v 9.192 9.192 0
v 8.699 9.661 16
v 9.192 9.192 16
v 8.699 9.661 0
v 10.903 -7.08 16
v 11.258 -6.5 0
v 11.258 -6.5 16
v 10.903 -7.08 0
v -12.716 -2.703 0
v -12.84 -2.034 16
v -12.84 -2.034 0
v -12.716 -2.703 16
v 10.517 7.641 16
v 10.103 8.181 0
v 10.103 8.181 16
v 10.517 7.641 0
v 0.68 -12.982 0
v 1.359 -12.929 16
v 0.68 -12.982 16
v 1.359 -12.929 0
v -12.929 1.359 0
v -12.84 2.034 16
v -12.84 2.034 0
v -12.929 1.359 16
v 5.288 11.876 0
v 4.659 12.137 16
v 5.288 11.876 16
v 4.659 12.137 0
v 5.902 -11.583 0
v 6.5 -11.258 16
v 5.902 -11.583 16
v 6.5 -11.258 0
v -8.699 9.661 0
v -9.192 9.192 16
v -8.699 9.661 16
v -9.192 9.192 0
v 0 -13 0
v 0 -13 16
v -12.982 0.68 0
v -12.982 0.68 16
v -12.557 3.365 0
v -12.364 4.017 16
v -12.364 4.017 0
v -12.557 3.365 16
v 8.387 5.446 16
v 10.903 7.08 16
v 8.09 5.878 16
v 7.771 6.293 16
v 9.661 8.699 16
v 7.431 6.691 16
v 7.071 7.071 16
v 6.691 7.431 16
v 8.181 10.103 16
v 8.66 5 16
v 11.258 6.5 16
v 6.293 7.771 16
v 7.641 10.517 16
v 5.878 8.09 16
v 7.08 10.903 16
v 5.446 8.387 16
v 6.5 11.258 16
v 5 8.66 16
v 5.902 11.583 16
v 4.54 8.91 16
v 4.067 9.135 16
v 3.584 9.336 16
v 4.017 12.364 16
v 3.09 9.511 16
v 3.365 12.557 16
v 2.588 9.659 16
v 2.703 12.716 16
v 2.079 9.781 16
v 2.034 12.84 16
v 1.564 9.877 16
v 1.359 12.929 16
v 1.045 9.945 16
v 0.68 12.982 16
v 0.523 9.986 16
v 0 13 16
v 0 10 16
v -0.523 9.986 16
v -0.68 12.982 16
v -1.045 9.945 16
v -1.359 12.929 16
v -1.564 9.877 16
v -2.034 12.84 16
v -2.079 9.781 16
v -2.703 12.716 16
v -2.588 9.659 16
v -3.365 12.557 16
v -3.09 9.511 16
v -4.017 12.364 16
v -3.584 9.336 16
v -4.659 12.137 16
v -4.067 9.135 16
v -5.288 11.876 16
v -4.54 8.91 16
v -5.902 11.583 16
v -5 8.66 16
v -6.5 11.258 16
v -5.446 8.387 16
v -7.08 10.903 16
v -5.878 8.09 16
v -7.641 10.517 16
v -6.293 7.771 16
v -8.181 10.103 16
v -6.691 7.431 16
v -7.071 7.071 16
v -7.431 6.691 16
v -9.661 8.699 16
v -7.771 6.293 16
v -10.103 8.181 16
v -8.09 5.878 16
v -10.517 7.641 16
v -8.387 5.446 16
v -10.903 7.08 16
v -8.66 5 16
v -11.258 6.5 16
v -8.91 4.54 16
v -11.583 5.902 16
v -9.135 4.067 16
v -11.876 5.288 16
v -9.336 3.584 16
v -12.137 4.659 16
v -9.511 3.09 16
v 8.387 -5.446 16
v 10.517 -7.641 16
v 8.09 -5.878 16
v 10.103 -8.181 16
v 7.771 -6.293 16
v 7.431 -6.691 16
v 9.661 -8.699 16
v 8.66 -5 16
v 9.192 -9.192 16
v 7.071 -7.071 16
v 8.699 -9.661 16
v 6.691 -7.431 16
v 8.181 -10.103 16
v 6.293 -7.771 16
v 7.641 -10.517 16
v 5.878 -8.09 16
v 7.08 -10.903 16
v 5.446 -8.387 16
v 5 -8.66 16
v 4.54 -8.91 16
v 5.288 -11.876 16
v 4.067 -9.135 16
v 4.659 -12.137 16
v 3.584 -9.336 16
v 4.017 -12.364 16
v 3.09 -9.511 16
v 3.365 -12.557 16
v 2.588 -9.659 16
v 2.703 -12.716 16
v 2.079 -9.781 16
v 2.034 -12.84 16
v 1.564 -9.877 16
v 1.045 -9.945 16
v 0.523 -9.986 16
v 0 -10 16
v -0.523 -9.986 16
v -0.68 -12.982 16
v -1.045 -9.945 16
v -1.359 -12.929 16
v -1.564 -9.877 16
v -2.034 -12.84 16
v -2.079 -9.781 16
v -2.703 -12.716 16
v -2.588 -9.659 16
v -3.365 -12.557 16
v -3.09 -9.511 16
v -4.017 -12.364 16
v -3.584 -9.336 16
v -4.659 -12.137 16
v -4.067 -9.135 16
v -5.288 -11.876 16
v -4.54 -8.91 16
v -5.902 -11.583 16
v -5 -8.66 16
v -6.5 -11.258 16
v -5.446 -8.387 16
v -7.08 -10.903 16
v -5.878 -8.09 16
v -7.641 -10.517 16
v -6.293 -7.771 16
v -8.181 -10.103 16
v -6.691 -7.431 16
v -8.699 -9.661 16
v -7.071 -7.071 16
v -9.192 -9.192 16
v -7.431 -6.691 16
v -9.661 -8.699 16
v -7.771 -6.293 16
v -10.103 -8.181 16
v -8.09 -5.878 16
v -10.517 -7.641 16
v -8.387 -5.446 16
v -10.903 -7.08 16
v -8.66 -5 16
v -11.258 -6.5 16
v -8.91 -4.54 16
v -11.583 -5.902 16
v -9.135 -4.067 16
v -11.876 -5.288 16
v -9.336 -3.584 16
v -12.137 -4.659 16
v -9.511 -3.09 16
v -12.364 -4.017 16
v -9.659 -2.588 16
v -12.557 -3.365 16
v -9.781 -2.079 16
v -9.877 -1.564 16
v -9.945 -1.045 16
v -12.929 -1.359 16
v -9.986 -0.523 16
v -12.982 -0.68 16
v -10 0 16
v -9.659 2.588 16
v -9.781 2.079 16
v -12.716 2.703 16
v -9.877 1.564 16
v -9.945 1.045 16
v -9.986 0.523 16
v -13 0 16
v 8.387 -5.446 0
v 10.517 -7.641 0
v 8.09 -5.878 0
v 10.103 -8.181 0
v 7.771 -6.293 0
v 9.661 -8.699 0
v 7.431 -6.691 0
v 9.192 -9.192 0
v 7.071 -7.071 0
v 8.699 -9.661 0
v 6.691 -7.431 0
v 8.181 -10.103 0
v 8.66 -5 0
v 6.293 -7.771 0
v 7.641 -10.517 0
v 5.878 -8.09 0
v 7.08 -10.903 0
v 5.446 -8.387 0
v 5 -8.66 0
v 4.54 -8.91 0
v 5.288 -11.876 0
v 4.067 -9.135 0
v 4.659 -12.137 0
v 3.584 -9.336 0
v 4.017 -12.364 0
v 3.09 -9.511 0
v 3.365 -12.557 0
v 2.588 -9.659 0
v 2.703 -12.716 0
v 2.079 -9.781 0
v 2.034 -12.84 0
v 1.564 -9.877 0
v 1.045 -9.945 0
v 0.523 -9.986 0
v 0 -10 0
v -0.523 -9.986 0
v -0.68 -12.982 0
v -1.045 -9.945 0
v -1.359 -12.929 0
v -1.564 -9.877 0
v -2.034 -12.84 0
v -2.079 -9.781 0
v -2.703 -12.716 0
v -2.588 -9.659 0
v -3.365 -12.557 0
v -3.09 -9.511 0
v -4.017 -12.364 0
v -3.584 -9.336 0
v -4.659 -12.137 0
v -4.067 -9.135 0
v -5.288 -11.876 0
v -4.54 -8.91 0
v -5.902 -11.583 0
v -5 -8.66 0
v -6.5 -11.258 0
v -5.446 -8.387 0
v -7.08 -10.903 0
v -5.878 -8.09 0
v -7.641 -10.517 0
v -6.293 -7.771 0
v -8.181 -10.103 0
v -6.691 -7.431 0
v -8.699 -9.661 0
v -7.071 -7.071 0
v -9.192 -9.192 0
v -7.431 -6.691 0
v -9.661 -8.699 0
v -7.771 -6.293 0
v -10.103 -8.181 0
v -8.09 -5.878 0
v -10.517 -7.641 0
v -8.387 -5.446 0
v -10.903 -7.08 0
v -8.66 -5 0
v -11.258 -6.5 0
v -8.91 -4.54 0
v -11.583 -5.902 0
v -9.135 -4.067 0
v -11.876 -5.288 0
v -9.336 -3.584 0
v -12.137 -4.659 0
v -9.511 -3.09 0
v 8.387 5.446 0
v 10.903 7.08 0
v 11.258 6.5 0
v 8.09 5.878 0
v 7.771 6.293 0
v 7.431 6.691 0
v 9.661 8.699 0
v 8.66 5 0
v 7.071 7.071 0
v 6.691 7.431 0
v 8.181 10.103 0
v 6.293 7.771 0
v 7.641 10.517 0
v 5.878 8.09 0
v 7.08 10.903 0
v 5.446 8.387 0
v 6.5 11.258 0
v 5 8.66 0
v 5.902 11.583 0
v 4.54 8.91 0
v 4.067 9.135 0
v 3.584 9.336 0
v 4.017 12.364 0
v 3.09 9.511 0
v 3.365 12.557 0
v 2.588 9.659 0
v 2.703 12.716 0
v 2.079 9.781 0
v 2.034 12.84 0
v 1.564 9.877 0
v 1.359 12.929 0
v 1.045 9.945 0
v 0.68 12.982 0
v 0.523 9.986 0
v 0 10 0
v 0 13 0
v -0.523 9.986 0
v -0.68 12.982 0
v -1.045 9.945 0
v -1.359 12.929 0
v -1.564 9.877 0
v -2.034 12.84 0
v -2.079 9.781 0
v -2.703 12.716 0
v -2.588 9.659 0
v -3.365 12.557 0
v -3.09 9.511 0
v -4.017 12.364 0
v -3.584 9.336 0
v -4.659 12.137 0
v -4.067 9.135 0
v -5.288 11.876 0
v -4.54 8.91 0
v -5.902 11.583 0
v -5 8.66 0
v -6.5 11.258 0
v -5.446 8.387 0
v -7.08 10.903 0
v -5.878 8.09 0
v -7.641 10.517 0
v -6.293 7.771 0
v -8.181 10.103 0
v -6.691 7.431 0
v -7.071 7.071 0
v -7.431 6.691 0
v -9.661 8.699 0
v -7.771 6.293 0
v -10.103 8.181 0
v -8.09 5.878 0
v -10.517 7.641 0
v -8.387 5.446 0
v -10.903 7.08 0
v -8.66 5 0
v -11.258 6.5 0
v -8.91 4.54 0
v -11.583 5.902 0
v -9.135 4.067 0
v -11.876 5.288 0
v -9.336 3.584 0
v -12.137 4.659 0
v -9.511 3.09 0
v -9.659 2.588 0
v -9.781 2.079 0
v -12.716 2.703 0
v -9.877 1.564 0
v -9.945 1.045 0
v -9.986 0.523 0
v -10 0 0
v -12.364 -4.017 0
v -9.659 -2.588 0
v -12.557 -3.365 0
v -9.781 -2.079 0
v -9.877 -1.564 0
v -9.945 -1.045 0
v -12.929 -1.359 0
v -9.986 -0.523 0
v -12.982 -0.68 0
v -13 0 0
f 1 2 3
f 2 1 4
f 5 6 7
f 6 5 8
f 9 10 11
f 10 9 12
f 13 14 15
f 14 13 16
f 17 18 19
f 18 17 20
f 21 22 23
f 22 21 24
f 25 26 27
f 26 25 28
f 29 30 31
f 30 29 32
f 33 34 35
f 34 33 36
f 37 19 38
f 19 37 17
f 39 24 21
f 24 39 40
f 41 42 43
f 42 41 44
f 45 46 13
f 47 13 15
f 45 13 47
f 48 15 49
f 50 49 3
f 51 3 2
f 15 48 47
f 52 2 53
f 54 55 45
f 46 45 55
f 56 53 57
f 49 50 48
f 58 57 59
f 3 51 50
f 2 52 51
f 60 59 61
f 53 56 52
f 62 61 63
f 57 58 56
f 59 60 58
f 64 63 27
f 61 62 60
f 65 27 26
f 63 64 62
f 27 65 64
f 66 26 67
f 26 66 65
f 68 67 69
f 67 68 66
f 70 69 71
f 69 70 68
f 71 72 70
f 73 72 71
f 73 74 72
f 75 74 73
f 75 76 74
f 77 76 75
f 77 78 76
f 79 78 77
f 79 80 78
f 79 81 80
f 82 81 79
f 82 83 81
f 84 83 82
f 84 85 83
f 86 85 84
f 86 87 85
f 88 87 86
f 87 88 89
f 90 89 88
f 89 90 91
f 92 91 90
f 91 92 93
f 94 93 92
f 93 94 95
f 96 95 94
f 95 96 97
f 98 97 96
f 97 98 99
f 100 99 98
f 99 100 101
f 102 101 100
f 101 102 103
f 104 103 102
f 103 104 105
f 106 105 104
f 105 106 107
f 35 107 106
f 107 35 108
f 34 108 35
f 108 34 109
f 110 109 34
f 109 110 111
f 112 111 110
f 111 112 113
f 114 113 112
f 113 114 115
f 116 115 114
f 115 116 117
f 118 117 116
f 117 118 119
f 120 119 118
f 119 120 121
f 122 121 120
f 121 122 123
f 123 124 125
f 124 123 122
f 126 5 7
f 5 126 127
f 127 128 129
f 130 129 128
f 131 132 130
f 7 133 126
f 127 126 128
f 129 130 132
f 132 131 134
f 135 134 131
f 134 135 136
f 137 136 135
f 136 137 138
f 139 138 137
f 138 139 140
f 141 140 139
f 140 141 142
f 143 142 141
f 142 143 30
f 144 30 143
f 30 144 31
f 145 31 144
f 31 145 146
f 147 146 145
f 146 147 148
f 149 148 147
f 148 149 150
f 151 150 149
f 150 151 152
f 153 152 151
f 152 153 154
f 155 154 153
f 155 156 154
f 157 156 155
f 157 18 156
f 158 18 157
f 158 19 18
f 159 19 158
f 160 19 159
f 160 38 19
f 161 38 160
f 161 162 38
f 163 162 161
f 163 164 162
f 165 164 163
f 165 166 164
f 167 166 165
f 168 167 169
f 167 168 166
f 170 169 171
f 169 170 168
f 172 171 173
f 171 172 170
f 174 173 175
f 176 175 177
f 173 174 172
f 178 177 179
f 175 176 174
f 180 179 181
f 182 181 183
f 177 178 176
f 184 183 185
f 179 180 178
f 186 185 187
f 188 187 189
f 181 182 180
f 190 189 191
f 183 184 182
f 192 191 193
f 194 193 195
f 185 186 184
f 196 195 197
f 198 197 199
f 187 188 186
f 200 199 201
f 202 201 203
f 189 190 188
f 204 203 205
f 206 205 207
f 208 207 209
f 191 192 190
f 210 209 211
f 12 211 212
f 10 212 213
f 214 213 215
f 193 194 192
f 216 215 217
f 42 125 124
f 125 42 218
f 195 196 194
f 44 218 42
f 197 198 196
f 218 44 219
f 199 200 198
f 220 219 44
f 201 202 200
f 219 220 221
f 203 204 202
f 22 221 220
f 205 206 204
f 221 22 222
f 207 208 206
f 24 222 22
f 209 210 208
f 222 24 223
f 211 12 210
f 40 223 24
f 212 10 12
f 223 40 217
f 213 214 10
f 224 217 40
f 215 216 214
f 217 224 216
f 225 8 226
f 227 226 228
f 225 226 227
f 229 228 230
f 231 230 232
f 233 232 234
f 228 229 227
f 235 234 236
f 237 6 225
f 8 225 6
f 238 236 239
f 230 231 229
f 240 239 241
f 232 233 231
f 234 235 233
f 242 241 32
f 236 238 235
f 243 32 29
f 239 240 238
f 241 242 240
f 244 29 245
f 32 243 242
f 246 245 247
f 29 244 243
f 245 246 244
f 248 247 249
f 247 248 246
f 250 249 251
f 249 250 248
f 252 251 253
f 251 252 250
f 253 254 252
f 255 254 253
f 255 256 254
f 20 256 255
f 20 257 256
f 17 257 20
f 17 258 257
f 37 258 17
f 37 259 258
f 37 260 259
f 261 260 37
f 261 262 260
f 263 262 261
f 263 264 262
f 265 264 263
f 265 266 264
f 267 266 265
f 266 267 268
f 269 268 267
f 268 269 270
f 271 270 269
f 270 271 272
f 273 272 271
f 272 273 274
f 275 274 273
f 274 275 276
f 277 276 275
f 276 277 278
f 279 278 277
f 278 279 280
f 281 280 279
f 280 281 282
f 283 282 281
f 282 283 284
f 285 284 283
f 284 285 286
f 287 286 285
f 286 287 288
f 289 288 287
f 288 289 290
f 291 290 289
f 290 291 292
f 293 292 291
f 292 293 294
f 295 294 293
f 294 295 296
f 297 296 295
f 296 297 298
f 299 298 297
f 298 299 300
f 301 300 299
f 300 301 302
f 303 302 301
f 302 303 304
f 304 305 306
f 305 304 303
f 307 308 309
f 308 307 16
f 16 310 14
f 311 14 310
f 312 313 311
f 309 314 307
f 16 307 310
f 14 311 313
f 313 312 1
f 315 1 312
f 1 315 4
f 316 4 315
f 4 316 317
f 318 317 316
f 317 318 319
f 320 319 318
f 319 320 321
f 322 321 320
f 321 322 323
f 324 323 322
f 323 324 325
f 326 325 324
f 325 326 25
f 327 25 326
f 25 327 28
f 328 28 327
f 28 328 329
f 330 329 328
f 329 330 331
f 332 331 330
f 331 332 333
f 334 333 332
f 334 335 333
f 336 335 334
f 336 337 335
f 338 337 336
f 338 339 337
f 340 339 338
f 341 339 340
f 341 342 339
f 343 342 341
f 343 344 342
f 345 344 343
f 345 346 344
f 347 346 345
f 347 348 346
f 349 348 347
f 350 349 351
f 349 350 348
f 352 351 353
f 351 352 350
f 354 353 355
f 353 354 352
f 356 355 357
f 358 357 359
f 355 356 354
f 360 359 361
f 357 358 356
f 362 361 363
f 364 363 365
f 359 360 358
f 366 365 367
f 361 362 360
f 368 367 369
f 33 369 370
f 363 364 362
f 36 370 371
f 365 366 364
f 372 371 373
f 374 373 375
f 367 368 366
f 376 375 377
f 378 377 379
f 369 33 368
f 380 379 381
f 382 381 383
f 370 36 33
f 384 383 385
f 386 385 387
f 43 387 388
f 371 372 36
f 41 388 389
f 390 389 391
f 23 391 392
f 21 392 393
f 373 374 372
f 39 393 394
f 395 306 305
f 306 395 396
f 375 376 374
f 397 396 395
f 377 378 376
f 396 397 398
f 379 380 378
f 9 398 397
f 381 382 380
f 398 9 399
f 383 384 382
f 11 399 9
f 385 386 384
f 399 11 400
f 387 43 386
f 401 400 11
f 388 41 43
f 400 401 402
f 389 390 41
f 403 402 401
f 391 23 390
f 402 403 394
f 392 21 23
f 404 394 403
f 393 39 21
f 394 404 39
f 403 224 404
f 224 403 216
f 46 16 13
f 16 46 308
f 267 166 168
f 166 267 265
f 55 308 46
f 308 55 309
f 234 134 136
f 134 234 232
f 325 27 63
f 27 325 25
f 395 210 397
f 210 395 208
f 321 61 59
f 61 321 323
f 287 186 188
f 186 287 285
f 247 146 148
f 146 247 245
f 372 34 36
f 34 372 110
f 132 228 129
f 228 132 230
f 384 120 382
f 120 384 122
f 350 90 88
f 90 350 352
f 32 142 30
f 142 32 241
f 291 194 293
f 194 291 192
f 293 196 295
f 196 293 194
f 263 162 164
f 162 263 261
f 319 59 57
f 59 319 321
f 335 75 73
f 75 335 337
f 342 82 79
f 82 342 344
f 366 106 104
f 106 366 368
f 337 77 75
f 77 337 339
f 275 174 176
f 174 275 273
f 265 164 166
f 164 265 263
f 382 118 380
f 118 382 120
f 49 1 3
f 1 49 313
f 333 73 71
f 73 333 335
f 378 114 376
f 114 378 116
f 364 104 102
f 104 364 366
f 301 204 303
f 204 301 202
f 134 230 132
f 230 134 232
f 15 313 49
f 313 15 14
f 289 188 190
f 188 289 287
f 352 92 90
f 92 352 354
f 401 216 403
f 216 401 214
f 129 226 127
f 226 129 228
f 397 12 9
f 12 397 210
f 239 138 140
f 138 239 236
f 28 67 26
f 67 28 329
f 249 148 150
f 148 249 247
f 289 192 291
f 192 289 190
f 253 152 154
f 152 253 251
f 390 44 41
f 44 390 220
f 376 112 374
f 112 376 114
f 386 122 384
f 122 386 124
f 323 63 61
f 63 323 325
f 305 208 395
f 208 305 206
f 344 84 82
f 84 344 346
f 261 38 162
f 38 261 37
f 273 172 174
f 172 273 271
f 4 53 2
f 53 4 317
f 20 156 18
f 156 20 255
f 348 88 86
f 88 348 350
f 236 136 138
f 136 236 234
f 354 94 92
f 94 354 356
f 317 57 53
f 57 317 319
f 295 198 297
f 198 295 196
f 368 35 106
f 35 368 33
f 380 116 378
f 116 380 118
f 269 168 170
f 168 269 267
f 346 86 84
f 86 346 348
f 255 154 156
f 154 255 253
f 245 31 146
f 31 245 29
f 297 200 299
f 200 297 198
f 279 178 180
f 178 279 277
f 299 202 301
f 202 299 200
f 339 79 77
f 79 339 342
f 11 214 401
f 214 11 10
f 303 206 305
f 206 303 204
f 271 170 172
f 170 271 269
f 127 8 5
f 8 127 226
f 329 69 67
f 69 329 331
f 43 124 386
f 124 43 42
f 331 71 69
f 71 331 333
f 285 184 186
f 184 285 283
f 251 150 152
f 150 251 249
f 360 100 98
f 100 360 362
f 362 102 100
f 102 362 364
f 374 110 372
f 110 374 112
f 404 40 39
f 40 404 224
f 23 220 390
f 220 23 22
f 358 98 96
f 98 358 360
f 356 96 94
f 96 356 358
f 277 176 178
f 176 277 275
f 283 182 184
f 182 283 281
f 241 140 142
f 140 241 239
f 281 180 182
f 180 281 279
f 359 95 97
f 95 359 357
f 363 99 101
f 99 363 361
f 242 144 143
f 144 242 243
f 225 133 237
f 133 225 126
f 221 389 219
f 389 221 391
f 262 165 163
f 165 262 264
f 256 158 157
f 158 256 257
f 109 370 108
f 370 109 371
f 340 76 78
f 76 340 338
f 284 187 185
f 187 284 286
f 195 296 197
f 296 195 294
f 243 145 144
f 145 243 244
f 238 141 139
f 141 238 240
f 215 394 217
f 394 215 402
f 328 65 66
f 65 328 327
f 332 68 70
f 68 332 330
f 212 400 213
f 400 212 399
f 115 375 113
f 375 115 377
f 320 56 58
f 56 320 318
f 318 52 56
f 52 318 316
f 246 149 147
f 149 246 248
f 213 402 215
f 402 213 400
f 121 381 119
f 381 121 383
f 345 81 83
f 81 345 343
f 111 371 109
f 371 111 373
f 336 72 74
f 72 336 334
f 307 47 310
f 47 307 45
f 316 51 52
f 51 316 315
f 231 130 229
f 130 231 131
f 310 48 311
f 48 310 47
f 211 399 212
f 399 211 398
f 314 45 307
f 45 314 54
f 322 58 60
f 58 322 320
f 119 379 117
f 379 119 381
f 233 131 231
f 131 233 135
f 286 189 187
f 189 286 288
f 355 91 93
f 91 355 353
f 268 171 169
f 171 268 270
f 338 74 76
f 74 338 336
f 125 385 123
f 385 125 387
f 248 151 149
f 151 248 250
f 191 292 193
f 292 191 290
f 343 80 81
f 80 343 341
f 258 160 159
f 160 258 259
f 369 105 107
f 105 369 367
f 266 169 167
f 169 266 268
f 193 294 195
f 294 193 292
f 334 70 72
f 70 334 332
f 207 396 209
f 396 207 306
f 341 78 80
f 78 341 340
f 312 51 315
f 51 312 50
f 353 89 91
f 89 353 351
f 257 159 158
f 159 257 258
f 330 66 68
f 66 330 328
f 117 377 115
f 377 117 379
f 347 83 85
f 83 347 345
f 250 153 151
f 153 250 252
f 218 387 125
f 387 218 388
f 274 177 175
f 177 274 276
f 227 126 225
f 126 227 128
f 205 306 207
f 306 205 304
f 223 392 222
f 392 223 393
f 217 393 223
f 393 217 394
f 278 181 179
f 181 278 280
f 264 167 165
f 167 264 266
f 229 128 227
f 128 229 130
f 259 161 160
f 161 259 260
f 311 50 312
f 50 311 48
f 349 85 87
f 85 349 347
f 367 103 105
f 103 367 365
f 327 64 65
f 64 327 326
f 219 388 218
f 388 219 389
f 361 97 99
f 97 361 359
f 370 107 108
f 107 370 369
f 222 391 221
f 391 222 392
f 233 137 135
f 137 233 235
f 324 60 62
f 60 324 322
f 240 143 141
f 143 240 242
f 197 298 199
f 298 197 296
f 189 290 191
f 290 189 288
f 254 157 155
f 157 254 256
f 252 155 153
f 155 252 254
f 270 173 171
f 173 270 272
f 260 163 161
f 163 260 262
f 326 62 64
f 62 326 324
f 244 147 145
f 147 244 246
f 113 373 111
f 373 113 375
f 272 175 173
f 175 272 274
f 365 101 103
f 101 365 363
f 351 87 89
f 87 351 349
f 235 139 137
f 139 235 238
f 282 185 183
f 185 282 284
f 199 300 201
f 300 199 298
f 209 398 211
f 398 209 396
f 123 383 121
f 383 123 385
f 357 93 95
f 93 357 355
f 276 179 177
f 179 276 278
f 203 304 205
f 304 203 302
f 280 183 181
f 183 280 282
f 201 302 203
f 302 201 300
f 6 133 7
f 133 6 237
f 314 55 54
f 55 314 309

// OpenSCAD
$fn = 120;
EPS = 0.05;

/* [View] */
design_view = "final"; // [final,01-ring,02-opening]

/* [Clamp] */
tube_diameter = 20;
clearance = 0.0;
wall_thickness = 3;
clamp_width = 16;
opening_angle = 60;


// -----------------------------------------------------------------------------
// Public API
// -----------------------------------------------------------------------------

module tube_clamp(
    tube_diameter,
    clearance,
    wall_thickness,
    clamp_width,
    opening_angle
) {
    assert(tube_diameter > 0, "tube_diameter must be > 0");
    assert(clearance >= 0, "clearance must be >= 0");
    assert(wall_thickness > 0, "wall_thickness must be > 0");
    assert(clamp_width > 0, "clamp_width must be > 0");
    assert(
        opening_angle > 0 && opening_angle < 180,
        "opening_angle must be between 0 and 180 degrees"
    );

    difference() {
        _full_ring(
            tube_diameter,
            clearance,
            wall_thickness,
            clamp_width
        );

        _opening_cutter(
            tube_diameter,
            clearance,
            wall_thickness,
            clamp_width,
            opening_angle
        );
    }
}


module render_tube_clamp(
    mode = "final",
    tube_diameter = 20,
    clearance = 0.0,
    wall_thickness = 3,
    clamp_width = 16,
    opening_angle = 60
) {
    if (mode == "01-ring") {
        _full_ring(
            tube_diameter,
            clearance,
            wall_thickness,
            clamp_width
        );
    } else if (mode == "02-opening") {
        color("lightgray")
            _full_ring(
                tube_diameter,
                clearance,
                wall_thickness,
                clamp_width
            );

        color([1, 0.25, 0.15, 0.55])
            _opening_cutter(
                tube_diameter,
                clearance,
                wall_thickness,
                clamp_width,
                opening_angle
            );
    } else {
        tube_clamp(
            tube_diameter,
            clearance,
            wall_thickness,
            clamp_width,
            opening_angle
        );
    }
}


// -----------------------------------------------------------------------------
// Private implementation
// -----------------------------------------------------------------------------

function _clamp_inner_radius(
    tube_diameter,
    clearance
) =
    (tube_diameter + clearance) / 2;


function _clamp_outer_radius(
    tube_diameter,
    clearance,
    wall_thickness
) =
    _clamp_inner_radius(
        tube_diameter,
        clearance
    ) + wall_thickness;


module _full_ring(
    tube_diameter,
    clearance,
    wall_thickness,
    clamp_width
) {
    inner_r = _clamp_inner_radius(
        tube_diameter,
        clearance
    );

    outer_r = _clamp_outer_radius(
        tube_diameter,
        clearance,
        wall_thickness
    );

    difference() {
        cylinder(
            h = clamp_width,
            r = outer_r
        );

        translate([0, 0, -EPS])
            cylinder(
                h = clamp_width + 2 * EPS,
                r = inner_r
            );
    }
}


module _opening_cutter(
    tube_diameter,
    clearance,
    wall_thickness,
    clamp_width,
    opening_angle
) {
    outer_r = _clamp_outer_radius(
        tube_diameter,
        clearance,
        wall_thickness
    );

    cutter_length = outer_r + 10;
    cutter_half_width =
        cutter_length * tan(opening_angle / 2);

    translate([0, 0, -EPS])
        linear_extrude(
            height = clamp_width + 2 * EPS
        )
            polygon(points = [
                [0, 0],
                [cutter_length, -cutter_half_width],
                [cutter_length,  cutter_half_width]
            ]);
}


// -----------------------------------------------------------------------------
// Direct-open preview
// -----------------------------------------------------------------------------

render_tube_clamp(
    mode = design_view,
    tube_diameter = tube_diameter,
    clearance = clearance,
    wall_thickness = wall_thickness,
    clamp_width = clamp_width,
    opening_angle = opening_angle
);
